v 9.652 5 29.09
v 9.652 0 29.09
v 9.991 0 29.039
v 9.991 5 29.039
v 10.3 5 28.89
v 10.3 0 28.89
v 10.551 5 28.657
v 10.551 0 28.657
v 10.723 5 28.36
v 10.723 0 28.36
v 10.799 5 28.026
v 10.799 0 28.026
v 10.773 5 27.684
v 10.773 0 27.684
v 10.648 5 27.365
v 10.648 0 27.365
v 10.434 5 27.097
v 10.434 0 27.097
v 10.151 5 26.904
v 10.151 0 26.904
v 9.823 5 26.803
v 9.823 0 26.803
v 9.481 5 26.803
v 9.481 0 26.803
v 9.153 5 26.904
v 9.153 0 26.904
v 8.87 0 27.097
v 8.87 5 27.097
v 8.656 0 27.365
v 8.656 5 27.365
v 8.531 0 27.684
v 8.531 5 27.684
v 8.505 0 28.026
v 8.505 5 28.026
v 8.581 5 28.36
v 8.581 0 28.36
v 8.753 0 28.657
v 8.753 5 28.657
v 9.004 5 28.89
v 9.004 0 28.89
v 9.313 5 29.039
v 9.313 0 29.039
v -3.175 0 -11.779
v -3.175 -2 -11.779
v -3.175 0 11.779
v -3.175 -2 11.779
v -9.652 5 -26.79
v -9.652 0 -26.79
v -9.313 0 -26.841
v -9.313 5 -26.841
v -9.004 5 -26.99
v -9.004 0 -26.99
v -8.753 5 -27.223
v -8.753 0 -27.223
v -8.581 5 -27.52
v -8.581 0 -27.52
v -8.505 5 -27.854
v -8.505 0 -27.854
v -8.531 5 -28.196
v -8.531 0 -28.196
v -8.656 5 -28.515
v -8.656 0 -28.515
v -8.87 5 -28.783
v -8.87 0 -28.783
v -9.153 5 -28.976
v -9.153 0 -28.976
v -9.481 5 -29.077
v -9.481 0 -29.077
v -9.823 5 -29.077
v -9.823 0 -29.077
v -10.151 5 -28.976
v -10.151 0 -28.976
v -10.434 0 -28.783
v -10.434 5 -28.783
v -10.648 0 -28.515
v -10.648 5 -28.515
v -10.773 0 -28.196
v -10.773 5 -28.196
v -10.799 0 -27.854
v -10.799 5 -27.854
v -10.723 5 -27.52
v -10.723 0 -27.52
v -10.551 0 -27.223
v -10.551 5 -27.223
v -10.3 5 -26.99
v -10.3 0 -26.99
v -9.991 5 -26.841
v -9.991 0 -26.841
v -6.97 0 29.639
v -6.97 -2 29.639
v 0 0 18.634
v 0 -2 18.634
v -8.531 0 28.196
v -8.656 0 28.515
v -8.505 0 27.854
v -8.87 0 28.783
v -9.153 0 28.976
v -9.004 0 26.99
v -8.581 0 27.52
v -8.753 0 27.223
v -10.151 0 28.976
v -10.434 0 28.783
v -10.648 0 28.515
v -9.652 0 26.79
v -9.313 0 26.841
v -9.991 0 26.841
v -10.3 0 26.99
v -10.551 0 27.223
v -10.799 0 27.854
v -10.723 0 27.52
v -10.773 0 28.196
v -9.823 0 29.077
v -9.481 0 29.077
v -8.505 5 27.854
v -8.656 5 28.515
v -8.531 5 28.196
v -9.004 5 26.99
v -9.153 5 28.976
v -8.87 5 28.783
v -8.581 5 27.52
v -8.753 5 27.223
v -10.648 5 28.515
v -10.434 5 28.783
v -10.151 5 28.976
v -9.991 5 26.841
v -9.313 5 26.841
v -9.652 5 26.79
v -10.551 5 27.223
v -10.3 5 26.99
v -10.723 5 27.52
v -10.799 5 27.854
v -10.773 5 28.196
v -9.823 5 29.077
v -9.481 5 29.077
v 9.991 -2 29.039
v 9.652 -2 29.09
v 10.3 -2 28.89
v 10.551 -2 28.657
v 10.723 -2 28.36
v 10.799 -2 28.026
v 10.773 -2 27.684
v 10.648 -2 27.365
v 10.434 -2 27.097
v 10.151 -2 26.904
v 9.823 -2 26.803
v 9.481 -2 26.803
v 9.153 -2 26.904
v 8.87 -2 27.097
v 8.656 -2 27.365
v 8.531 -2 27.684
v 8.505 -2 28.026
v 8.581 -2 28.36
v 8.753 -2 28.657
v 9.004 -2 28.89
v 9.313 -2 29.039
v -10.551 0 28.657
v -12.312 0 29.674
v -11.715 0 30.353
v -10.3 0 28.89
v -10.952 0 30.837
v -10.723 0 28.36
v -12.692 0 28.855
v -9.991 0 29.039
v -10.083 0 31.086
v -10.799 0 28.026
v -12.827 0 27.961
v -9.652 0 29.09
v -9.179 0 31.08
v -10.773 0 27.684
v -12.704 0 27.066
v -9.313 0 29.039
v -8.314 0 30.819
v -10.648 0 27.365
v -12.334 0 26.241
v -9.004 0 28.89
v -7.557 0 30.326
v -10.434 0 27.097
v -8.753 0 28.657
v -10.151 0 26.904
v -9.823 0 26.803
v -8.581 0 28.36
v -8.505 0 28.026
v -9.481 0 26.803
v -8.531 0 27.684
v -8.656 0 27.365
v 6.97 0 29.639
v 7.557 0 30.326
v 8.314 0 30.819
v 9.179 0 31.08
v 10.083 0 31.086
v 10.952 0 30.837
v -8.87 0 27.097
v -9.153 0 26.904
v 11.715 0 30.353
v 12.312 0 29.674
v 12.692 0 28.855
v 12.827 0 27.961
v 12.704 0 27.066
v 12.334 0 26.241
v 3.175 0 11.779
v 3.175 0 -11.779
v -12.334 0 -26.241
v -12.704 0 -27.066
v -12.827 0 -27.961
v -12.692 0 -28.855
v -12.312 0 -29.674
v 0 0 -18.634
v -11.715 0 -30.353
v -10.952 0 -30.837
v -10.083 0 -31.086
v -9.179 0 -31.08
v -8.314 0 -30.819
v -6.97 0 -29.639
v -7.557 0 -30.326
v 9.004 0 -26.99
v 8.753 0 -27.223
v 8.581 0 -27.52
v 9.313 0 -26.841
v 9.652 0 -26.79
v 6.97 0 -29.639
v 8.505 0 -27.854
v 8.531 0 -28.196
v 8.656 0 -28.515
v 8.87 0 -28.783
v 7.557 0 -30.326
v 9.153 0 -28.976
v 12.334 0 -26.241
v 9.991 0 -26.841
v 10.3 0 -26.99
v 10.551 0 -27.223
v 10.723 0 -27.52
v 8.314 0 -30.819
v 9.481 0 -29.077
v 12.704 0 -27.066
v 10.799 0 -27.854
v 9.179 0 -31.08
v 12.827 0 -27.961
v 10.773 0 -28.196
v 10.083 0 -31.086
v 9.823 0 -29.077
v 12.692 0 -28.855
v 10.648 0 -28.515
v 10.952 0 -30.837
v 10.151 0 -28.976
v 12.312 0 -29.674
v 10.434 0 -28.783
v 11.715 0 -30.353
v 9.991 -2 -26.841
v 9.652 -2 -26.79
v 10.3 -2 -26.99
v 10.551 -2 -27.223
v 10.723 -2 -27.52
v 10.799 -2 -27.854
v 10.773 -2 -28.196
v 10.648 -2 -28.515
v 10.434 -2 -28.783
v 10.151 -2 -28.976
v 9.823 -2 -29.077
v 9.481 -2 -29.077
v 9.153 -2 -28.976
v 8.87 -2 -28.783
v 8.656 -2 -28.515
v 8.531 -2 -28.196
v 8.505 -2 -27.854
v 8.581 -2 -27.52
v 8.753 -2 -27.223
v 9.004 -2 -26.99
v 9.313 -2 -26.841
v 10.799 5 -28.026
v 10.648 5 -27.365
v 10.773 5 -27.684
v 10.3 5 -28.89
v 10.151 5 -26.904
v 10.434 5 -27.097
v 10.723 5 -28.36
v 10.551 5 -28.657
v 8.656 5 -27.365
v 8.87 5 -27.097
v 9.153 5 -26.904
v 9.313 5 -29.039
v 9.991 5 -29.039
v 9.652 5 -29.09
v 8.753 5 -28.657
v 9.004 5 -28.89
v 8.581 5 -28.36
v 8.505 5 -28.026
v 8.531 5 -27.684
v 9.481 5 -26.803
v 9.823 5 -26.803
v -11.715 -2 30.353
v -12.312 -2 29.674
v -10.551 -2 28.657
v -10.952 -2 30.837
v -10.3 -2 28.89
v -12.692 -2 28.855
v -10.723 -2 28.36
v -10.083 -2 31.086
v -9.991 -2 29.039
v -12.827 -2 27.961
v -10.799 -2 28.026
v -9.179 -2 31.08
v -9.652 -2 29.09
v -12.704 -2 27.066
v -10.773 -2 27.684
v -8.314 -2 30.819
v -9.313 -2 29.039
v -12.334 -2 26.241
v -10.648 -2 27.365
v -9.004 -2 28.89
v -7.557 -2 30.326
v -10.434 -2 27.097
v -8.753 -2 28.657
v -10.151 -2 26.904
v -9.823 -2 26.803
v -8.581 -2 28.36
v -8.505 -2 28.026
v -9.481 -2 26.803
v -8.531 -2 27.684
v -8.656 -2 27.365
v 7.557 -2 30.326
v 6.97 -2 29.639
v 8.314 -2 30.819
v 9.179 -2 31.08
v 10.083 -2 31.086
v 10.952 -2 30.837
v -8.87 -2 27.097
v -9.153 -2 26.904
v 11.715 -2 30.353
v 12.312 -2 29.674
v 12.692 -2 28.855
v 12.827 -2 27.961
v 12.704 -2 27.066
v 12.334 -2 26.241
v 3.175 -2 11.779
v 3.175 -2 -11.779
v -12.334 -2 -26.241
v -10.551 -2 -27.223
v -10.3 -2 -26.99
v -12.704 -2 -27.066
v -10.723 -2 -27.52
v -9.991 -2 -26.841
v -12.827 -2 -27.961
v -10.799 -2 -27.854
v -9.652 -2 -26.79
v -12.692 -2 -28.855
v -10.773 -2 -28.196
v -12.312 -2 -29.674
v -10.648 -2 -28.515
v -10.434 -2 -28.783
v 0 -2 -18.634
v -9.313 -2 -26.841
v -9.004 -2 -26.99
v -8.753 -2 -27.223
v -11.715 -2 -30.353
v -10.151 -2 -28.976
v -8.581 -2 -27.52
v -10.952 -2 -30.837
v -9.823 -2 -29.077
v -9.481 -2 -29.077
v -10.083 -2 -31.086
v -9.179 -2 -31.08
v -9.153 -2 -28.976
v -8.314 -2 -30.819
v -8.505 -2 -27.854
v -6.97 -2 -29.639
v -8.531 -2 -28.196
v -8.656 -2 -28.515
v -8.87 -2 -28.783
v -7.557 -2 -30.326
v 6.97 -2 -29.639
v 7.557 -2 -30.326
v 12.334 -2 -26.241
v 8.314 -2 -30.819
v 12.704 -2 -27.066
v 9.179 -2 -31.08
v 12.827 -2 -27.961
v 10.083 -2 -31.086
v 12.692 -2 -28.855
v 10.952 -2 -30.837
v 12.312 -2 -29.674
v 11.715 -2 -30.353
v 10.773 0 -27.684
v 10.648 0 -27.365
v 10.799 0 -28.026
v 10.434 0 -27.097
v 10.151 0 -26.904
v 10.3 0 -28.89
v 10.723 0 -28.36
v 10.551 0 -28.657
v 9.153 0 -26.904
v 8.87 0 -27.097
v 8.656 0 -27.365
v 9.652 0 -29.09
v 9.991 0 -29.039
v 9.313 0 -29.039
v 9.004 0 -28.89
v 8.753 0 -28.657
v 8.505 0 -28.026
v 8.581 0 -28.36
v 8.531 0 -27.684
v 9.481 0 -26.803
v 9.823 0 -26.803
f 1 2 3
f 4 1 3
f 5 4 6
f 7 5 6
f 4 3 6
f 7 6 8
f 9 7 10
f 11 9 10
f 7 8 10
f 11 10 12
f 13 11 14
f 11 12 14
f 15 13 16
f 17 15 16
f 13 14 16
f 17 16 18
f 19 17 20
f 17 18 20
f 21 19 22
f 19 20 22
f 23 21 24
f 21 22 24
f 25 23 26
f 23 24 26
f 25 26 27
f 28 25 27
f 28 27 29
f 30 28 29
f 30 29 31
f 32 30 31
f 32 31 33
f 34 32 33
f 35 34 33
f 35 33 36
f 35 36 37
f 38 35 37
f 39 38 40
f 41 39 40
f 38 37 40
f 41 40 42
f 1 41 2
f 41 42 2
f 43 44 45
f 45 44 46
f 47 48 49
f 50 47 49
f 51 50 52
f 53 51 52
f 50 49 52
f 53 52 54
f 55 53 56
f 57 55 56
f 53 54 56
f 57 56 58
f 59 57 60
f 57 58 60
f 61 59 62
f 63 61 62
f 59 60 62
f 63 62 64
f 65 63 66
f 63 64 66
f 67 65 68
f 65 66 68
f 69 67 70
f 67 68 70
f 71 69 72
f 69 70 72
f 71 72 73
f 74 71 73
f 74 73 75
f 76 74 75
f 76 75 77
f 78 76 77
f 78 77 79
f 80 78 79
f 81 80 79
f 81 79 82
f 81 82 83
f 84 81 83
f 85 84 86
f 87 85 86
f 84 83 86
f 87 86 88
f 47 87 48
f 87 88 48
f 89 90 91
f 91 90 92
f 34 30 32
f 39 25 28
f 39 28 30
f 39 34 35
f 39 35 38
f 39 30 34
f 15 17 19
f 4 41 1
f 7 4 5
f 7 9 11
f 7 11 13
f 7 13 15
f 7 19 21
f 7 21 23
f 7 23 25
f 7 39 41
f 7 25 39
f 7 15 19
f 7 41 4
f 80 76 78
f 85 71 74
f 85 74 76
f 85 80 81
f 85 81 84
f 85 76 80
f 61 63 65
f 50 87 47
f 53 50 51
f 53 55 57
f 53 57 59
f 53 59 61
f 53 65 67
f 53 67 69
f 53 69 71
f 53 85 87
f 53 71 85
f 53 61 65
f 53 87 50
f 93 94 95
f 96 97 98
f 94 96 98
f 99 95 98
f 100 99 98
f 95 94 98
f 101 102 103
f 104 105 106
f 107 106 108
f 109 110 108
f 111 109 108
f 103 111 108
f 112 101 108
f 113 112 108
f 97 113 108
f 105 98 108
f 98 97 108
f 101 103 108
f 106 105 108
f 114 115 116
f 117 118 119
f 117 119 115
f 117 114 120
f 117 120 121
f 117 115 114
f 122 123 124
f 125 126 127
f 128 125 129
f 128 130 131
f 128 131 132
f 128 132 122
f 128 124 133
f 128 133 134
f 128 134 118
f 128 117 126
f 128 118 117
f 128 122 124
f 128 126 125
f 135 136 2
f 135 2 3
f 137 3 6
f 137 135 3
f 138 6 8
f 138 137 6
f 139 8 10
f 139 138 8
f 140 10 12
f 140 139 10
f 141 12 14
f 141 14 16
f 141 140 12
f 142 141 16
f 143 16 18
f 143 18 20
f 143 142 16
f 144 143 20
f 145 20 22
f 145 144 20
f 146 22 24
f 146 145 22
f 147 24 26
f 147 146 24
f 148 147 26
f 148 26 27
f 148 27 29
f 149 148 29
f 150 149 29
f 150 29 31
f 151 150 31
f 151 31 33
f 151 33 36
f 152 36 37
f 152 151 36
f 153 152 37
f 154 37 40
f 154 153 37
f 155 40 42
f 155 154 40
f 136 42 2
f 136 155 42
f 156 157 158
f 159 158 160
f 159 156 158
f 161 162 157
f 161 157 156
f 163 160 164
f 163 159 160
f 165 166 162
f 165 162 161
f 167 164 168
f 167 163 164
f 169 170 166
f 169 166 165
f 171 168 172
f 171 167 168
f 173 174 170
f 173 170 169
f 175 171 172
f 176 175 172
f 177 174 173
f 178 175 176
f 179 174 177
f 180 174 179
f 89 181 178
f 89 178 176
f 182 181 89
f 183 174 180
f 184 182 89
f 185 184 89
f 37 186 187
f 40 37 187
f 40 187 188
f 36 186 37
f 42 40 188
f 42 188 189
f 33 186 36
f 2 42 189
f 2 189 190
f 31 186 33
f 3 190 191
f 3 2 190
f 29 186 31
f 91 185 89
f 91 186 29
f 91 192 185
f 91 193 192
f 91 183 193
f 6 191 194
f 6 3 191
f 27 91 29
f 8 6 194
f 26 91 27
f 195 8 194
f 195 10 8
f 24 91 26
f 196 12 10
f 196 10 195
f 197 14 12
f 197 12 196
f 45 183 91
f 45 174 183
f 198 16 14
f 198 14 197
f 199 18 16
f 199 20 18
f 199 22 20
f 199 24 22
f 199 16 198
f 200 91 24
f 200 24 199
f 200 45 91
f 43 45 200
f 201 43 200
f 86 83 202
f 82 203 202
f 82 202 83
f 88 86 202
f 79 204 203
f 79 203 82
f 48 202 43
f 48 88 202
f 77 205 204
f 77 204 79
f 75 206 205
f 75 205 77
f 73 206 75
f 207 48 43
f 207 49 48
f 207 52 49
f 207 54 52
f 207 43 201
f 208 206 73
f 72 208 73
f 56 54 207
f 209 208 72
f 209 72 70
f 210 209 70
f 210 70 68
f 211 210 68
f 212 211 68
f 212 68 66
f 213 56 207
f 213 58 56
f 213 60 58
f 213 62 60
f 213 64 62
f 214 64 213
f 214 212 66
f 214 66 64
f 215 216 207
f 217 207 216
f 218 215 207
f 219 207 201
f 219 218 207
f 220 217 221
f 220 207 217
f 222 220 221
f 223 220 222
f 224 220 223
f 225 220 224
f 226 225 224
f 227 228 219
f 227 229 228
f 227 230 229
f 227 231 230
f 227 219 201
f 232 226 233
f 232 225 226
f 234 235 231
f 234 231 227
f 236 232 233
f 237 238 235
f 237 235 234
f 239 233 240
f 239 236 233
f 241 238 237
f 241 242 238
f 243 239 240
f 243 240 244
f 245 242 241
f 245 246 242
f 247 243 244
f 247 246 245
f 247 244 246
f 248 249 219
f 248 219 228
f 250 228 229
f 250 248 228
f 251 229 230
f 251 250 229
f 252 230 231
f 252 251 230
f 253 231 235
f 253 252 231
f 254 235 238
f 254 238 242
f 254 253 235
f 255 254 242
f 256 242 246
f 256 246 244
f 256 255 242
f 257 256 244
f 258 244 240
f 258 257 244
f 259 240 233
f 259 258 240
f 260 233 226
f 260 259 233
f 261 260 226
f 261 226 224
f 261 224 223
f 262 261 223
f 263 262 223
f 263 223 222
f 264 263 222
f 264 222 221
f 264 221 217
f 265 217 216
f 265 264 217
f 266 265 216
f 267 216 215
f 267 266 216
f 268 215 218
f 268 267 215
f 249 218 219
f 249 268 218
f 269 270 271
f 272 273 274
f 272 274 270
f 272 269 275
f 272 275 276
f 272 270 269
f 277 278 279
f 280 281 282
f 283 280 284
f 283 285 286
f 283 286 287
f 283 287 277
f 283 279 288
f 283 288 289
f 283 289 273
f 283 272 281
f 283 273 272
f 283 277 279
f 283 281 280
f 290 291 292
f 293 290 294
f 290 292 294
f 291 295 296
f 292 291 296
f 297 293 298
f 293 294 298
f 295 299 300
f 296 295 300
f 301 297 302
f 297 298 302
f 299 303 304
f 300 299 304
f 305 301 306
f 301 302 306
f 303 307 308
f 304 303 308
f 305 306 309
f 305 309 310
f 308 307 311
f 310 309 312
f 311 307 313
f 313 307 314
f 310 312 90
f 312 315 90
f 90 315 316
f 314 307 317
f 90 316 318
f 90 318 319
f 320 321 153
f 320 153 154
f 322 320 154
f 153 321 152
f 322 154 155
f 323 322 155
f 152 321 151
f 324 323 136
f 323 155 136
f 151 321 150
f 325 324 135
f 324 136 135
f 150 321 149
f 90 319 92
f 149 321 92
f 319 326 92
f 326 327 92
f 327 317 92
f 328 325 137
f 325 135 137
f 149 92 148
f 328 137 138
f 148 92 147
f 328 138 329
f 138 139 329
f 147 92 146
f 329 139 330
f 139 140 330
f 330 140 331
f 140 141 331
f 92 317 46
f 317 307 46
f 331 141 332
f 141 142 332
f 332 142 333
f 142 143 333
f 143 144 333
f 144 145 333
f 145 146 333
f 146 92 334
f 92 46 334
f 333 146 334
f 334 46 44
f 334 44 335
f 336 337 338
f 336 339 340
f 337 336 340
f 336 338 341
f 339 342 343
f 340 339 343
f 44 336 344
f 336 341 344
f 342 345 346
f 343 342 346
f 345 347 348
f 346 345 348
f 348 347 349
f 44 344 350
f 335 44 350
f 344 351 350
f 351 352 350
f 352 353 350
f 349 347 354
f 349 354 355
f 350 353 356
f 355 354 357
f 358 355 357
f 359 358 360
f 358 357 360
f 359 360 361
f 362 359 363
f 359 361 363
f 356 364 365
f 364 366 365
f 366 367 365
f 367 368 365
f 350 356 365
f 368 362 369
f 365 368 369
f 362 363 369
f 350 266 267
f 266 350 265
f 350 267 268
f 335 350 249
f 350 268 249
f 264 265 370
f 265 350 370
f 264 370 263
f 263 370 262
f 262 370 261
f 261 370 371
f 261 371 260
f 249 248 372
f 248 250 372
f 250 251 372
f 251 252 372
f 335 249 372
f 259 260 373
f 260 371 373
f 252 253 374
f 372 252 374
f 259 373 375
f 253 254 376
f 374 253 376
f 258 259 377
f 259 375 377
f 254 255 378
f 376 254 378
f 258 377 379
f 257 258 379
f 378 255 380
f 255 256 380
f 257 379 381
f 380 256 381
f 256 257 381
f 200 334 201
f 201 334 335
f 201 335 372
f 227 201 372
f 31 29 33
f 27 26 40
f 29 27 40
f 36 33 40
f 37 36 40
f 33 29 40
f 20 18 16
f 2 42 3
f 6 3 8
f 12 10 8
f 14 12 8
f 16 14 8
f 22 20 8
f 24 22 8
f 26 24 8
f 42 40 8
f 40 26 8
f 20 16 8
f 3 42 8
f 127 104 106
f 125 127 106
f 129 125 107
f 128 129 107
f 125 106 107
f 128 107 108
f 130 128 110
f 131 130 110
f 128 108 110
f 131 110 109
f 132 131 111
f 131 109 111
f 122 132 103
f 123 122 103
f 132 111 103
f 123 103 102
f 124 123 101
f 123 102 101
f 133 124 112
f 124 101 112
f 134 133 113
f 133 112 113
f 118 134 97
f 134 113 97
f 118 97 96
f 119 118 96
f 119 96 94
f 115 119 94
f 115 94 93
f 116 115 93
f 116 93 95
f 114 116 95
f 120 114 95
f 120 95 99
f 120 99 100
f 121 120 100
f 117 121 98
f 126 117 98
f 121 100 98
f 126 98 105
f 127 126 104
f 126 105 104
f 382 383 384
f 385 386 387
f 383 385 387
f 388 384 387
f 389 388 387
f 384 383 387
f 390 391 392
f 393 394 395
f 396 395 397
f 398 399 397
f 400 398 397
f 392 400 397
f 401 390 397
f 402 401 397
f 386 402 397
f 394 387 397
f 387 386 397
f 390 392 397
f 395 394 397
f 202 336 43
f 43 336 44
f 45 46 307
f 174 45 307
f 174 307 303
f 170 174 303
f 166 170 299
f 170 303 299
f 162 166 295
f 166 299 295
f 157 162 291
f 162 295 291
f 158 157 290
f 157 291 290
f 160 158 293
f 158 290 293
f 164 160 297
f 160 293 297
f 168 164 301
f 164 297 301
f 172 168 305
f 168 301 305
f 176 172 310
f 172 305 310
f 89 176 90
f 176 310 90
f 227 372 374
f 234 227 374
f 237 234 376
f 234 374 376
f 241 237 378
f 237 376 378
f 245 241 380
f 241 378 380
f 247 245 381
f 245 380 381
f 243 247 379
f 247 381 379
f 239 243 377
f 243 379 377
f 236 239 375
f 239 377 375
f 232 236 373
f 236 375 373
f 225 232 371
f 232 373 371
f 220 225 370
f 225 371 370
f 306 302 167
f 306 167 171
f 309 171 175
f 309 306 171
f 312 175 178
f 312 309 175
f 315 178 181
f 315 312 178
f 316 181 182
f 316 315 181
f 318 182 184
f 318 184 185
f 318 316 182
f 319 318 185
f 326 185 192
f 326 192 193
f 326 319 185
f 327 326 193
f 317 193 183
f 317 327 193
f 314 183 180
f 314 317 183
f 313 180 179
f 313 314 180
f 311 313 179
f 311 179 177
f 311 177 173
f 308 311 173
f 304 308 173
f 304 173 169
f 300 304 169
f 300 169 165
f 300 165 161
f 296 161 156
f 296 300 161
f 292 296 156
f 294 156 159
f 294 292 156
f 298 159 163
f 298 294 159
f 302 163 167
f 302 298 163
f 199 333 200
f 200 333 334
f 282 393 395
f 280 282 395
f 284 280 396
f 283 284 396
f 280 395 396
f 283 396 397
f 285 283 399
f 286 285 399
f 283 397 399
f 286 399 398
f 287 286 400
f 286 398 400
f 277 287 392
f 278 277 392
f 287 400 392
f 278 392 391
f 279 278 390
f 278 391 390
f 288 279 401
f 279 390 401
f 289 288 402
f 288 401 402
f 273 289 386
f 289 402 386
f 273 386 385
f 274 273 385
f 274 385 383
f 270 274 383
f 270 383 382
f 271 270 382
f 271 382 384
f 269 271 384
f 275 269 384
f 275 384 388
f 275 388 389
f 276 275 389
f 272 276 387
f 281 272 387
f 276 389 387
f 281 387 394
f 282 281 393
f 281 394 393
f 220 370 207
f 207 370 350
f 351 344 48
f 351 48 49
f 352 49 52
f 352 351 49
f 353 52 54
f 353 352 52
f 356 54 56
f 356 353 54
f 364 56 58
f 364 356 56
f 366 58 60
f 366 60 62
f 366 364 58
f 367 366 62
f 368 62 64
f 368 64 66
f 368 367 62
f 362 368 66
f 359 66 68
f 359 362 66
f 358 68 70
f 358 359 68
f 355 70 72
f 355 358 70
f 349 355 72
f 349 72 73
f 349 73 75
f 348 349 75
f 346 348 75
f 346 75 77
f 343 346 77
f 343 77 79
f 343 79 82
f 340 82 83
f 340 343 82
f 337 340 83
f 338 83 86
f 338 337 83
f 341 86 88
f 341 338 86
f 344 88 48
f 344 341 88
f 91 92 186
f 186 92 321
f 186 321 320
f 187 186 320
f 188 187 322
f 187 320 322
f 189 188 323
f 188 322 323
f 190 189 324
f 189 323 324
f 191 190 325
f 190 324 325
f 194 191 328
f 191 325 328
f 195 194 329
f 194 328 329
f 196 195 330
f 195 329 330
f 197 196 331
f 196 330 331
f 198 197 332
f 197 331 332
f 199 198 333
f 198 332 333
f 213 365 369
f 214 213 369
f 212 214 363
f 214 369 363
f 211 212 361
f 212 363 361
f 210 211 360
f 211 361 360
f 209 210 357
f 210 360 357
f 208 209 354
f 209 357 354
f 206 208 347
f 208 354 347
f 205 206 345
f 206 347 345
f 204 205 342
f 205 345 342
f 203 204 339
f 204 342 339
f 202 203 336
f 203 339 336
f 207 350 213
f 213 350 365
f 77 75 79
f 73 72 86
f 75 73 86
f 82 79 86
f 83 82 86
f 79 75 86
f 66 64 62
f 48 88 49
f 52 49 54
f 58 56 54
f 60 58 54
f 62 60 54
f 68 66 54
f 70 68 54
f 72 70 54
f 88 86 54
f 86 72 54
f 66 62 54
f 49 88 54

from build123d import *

# Parameters (mm, degrees)
SKETCH1_R             = 1.15
BOSS_EXTRUDE1_DEPTH   = 5
BOSS_EXTRUDE1_2_DEPTH = 5
BOSS_EXTRUDE1_3_DEPTH = 5
BOSS_EXTRUDE1_4_DEPTH = 5
BOSS_EXTRUDE2_START   = -2
SKETCH1_3_R           = 1.15
BOSS_EXTRUDE2_DEPTH   = 2


with BuildPart() as part:
    # Sketch1 → Boss-Extrude1 (new body)
    with BuildSketch(Plane(origin=(0, 0, 0), x_dir=(1, 0, 0), z_dir=(0, 1, 0))):
        with Locations((-9.652, 27.94)):
            Circle(SKETCH1_R)
    extrude(amount=BOSS_EXTRUDE1_DEPTH)


with BuildPart() as body_2:
    # Sketch1 → Boss-Extrude1 2 (new body)
    with BuildSketch(Plane(origin=(0, 0, 0), x_dir=(1, 0, 0), z_dir=(0, 1, 0))):
        with Locations((9.652, 27.94)):
            Circle(SKETCH1_R)
    extrude(amount=BOSS_EXTRUDE1_2_DEPTH)


with BuildPart() as body_3:
    # Sketch1 → Boss-Extrude1 3 (new body)
    with BuildSketch(Plane(origin=(0, 0, 0), x_dir=(1, 0, 0), z_dir=(0, 1, 0))):
        with Locations((-9.652, -27.94)):
            Circle(SKETCH1_R)
    extrude(amount=BOSS_EXTRUDE1_3_DEPTH)


with BuildPart() as body_4:
    # Sketch1 → Boss-Extrude1 4 (new body)
    with BuildSketch(Plane(origin=(0, 0, 0), x_dir=(1, 0, 0), z_dir=(0, 1, 0))):
        with Locations((9.652, -27.94)):
            Circle(SKETCH1_R)
    extrude(amount=BOSS_EXTRUDE1_4_DEPTH)


with BuildPart() as body_5:
    # Sketch1<3> → Boss-Extrude2 (new body)
    with BuildSketch(Plane(origin=(0, 0, 0), x_dir=(1, 0, 0), z_dir=(0, 1, 0)).offset(BOSS_EXTRUDE2_START)):
        with BuildLine():
            ThreePointArc((-6.969699435, 29.638790358), (-11.350790358, 30.622300565), (-12.334300565, 26.241209642))
            Line((-12.334300565, 26.241209642), (-3.175, 11.779156119))
            Line((-3.175, 11.779156119), (-3.175, -11.779156119))
            Line((-3.175, -11.779156119), (-12.334300565, -26.241209642))
            ThreePointArc((-12.334300565, -26.241209642), (-11.350790358, -30.622300565), (-6.969699435, -29.638790358))
            Line((-6.969699435, -29.638790358), (0, -18.634001776))
            Line((0, -18.634001776), (6.969699435, -29.638790358))
            ThreePointArc((6.969699435, -29.638790358), (11.350790358, -30.622300565), (12.334300565, -26.241209642))
            Line((12.334300565, -26.241209642), (3.175, -11.779156119))
            Line((3.175, -11.779156119), (3.175, 11.779156119))
            Line((3.175, 11.779156119), (12.334300565, 26.241209642))
            ThreePointArc((12.334300565, 26.241209642), (11.350790358, 30.622300565), (6.969699435, 29.638790358))
            Line((6.969699435, 29.638790358), (0, 18.634001776))
            Line((0, 18.634001776), (-6.969699435, 29.638790358))
        make_face()
        with Locations((-9.652, 27.94)):
            Circle(SKETCH1_3_R, mode=Mode.SUBTRACT)
        with Locations((9.652, 27.94)):
            Circle(SKETCH1_3_R, mode=Mode.SUBTRACT)
        with Locations((-9.652, -27.94)):
            Circle(SKETCH1_3_R, mode=Mode.SUBTRACT)
        with Locations((9.652, -27.94)):
            Circle(SKETCH1_3_R, mode=Mode.SUBTRACT)
    extrude(amount=BOSS_EXTRUDE2_DEPTH)


solid = Compound([part.part, body_2.part, body_3.part, body_4.part, body_5.part])
